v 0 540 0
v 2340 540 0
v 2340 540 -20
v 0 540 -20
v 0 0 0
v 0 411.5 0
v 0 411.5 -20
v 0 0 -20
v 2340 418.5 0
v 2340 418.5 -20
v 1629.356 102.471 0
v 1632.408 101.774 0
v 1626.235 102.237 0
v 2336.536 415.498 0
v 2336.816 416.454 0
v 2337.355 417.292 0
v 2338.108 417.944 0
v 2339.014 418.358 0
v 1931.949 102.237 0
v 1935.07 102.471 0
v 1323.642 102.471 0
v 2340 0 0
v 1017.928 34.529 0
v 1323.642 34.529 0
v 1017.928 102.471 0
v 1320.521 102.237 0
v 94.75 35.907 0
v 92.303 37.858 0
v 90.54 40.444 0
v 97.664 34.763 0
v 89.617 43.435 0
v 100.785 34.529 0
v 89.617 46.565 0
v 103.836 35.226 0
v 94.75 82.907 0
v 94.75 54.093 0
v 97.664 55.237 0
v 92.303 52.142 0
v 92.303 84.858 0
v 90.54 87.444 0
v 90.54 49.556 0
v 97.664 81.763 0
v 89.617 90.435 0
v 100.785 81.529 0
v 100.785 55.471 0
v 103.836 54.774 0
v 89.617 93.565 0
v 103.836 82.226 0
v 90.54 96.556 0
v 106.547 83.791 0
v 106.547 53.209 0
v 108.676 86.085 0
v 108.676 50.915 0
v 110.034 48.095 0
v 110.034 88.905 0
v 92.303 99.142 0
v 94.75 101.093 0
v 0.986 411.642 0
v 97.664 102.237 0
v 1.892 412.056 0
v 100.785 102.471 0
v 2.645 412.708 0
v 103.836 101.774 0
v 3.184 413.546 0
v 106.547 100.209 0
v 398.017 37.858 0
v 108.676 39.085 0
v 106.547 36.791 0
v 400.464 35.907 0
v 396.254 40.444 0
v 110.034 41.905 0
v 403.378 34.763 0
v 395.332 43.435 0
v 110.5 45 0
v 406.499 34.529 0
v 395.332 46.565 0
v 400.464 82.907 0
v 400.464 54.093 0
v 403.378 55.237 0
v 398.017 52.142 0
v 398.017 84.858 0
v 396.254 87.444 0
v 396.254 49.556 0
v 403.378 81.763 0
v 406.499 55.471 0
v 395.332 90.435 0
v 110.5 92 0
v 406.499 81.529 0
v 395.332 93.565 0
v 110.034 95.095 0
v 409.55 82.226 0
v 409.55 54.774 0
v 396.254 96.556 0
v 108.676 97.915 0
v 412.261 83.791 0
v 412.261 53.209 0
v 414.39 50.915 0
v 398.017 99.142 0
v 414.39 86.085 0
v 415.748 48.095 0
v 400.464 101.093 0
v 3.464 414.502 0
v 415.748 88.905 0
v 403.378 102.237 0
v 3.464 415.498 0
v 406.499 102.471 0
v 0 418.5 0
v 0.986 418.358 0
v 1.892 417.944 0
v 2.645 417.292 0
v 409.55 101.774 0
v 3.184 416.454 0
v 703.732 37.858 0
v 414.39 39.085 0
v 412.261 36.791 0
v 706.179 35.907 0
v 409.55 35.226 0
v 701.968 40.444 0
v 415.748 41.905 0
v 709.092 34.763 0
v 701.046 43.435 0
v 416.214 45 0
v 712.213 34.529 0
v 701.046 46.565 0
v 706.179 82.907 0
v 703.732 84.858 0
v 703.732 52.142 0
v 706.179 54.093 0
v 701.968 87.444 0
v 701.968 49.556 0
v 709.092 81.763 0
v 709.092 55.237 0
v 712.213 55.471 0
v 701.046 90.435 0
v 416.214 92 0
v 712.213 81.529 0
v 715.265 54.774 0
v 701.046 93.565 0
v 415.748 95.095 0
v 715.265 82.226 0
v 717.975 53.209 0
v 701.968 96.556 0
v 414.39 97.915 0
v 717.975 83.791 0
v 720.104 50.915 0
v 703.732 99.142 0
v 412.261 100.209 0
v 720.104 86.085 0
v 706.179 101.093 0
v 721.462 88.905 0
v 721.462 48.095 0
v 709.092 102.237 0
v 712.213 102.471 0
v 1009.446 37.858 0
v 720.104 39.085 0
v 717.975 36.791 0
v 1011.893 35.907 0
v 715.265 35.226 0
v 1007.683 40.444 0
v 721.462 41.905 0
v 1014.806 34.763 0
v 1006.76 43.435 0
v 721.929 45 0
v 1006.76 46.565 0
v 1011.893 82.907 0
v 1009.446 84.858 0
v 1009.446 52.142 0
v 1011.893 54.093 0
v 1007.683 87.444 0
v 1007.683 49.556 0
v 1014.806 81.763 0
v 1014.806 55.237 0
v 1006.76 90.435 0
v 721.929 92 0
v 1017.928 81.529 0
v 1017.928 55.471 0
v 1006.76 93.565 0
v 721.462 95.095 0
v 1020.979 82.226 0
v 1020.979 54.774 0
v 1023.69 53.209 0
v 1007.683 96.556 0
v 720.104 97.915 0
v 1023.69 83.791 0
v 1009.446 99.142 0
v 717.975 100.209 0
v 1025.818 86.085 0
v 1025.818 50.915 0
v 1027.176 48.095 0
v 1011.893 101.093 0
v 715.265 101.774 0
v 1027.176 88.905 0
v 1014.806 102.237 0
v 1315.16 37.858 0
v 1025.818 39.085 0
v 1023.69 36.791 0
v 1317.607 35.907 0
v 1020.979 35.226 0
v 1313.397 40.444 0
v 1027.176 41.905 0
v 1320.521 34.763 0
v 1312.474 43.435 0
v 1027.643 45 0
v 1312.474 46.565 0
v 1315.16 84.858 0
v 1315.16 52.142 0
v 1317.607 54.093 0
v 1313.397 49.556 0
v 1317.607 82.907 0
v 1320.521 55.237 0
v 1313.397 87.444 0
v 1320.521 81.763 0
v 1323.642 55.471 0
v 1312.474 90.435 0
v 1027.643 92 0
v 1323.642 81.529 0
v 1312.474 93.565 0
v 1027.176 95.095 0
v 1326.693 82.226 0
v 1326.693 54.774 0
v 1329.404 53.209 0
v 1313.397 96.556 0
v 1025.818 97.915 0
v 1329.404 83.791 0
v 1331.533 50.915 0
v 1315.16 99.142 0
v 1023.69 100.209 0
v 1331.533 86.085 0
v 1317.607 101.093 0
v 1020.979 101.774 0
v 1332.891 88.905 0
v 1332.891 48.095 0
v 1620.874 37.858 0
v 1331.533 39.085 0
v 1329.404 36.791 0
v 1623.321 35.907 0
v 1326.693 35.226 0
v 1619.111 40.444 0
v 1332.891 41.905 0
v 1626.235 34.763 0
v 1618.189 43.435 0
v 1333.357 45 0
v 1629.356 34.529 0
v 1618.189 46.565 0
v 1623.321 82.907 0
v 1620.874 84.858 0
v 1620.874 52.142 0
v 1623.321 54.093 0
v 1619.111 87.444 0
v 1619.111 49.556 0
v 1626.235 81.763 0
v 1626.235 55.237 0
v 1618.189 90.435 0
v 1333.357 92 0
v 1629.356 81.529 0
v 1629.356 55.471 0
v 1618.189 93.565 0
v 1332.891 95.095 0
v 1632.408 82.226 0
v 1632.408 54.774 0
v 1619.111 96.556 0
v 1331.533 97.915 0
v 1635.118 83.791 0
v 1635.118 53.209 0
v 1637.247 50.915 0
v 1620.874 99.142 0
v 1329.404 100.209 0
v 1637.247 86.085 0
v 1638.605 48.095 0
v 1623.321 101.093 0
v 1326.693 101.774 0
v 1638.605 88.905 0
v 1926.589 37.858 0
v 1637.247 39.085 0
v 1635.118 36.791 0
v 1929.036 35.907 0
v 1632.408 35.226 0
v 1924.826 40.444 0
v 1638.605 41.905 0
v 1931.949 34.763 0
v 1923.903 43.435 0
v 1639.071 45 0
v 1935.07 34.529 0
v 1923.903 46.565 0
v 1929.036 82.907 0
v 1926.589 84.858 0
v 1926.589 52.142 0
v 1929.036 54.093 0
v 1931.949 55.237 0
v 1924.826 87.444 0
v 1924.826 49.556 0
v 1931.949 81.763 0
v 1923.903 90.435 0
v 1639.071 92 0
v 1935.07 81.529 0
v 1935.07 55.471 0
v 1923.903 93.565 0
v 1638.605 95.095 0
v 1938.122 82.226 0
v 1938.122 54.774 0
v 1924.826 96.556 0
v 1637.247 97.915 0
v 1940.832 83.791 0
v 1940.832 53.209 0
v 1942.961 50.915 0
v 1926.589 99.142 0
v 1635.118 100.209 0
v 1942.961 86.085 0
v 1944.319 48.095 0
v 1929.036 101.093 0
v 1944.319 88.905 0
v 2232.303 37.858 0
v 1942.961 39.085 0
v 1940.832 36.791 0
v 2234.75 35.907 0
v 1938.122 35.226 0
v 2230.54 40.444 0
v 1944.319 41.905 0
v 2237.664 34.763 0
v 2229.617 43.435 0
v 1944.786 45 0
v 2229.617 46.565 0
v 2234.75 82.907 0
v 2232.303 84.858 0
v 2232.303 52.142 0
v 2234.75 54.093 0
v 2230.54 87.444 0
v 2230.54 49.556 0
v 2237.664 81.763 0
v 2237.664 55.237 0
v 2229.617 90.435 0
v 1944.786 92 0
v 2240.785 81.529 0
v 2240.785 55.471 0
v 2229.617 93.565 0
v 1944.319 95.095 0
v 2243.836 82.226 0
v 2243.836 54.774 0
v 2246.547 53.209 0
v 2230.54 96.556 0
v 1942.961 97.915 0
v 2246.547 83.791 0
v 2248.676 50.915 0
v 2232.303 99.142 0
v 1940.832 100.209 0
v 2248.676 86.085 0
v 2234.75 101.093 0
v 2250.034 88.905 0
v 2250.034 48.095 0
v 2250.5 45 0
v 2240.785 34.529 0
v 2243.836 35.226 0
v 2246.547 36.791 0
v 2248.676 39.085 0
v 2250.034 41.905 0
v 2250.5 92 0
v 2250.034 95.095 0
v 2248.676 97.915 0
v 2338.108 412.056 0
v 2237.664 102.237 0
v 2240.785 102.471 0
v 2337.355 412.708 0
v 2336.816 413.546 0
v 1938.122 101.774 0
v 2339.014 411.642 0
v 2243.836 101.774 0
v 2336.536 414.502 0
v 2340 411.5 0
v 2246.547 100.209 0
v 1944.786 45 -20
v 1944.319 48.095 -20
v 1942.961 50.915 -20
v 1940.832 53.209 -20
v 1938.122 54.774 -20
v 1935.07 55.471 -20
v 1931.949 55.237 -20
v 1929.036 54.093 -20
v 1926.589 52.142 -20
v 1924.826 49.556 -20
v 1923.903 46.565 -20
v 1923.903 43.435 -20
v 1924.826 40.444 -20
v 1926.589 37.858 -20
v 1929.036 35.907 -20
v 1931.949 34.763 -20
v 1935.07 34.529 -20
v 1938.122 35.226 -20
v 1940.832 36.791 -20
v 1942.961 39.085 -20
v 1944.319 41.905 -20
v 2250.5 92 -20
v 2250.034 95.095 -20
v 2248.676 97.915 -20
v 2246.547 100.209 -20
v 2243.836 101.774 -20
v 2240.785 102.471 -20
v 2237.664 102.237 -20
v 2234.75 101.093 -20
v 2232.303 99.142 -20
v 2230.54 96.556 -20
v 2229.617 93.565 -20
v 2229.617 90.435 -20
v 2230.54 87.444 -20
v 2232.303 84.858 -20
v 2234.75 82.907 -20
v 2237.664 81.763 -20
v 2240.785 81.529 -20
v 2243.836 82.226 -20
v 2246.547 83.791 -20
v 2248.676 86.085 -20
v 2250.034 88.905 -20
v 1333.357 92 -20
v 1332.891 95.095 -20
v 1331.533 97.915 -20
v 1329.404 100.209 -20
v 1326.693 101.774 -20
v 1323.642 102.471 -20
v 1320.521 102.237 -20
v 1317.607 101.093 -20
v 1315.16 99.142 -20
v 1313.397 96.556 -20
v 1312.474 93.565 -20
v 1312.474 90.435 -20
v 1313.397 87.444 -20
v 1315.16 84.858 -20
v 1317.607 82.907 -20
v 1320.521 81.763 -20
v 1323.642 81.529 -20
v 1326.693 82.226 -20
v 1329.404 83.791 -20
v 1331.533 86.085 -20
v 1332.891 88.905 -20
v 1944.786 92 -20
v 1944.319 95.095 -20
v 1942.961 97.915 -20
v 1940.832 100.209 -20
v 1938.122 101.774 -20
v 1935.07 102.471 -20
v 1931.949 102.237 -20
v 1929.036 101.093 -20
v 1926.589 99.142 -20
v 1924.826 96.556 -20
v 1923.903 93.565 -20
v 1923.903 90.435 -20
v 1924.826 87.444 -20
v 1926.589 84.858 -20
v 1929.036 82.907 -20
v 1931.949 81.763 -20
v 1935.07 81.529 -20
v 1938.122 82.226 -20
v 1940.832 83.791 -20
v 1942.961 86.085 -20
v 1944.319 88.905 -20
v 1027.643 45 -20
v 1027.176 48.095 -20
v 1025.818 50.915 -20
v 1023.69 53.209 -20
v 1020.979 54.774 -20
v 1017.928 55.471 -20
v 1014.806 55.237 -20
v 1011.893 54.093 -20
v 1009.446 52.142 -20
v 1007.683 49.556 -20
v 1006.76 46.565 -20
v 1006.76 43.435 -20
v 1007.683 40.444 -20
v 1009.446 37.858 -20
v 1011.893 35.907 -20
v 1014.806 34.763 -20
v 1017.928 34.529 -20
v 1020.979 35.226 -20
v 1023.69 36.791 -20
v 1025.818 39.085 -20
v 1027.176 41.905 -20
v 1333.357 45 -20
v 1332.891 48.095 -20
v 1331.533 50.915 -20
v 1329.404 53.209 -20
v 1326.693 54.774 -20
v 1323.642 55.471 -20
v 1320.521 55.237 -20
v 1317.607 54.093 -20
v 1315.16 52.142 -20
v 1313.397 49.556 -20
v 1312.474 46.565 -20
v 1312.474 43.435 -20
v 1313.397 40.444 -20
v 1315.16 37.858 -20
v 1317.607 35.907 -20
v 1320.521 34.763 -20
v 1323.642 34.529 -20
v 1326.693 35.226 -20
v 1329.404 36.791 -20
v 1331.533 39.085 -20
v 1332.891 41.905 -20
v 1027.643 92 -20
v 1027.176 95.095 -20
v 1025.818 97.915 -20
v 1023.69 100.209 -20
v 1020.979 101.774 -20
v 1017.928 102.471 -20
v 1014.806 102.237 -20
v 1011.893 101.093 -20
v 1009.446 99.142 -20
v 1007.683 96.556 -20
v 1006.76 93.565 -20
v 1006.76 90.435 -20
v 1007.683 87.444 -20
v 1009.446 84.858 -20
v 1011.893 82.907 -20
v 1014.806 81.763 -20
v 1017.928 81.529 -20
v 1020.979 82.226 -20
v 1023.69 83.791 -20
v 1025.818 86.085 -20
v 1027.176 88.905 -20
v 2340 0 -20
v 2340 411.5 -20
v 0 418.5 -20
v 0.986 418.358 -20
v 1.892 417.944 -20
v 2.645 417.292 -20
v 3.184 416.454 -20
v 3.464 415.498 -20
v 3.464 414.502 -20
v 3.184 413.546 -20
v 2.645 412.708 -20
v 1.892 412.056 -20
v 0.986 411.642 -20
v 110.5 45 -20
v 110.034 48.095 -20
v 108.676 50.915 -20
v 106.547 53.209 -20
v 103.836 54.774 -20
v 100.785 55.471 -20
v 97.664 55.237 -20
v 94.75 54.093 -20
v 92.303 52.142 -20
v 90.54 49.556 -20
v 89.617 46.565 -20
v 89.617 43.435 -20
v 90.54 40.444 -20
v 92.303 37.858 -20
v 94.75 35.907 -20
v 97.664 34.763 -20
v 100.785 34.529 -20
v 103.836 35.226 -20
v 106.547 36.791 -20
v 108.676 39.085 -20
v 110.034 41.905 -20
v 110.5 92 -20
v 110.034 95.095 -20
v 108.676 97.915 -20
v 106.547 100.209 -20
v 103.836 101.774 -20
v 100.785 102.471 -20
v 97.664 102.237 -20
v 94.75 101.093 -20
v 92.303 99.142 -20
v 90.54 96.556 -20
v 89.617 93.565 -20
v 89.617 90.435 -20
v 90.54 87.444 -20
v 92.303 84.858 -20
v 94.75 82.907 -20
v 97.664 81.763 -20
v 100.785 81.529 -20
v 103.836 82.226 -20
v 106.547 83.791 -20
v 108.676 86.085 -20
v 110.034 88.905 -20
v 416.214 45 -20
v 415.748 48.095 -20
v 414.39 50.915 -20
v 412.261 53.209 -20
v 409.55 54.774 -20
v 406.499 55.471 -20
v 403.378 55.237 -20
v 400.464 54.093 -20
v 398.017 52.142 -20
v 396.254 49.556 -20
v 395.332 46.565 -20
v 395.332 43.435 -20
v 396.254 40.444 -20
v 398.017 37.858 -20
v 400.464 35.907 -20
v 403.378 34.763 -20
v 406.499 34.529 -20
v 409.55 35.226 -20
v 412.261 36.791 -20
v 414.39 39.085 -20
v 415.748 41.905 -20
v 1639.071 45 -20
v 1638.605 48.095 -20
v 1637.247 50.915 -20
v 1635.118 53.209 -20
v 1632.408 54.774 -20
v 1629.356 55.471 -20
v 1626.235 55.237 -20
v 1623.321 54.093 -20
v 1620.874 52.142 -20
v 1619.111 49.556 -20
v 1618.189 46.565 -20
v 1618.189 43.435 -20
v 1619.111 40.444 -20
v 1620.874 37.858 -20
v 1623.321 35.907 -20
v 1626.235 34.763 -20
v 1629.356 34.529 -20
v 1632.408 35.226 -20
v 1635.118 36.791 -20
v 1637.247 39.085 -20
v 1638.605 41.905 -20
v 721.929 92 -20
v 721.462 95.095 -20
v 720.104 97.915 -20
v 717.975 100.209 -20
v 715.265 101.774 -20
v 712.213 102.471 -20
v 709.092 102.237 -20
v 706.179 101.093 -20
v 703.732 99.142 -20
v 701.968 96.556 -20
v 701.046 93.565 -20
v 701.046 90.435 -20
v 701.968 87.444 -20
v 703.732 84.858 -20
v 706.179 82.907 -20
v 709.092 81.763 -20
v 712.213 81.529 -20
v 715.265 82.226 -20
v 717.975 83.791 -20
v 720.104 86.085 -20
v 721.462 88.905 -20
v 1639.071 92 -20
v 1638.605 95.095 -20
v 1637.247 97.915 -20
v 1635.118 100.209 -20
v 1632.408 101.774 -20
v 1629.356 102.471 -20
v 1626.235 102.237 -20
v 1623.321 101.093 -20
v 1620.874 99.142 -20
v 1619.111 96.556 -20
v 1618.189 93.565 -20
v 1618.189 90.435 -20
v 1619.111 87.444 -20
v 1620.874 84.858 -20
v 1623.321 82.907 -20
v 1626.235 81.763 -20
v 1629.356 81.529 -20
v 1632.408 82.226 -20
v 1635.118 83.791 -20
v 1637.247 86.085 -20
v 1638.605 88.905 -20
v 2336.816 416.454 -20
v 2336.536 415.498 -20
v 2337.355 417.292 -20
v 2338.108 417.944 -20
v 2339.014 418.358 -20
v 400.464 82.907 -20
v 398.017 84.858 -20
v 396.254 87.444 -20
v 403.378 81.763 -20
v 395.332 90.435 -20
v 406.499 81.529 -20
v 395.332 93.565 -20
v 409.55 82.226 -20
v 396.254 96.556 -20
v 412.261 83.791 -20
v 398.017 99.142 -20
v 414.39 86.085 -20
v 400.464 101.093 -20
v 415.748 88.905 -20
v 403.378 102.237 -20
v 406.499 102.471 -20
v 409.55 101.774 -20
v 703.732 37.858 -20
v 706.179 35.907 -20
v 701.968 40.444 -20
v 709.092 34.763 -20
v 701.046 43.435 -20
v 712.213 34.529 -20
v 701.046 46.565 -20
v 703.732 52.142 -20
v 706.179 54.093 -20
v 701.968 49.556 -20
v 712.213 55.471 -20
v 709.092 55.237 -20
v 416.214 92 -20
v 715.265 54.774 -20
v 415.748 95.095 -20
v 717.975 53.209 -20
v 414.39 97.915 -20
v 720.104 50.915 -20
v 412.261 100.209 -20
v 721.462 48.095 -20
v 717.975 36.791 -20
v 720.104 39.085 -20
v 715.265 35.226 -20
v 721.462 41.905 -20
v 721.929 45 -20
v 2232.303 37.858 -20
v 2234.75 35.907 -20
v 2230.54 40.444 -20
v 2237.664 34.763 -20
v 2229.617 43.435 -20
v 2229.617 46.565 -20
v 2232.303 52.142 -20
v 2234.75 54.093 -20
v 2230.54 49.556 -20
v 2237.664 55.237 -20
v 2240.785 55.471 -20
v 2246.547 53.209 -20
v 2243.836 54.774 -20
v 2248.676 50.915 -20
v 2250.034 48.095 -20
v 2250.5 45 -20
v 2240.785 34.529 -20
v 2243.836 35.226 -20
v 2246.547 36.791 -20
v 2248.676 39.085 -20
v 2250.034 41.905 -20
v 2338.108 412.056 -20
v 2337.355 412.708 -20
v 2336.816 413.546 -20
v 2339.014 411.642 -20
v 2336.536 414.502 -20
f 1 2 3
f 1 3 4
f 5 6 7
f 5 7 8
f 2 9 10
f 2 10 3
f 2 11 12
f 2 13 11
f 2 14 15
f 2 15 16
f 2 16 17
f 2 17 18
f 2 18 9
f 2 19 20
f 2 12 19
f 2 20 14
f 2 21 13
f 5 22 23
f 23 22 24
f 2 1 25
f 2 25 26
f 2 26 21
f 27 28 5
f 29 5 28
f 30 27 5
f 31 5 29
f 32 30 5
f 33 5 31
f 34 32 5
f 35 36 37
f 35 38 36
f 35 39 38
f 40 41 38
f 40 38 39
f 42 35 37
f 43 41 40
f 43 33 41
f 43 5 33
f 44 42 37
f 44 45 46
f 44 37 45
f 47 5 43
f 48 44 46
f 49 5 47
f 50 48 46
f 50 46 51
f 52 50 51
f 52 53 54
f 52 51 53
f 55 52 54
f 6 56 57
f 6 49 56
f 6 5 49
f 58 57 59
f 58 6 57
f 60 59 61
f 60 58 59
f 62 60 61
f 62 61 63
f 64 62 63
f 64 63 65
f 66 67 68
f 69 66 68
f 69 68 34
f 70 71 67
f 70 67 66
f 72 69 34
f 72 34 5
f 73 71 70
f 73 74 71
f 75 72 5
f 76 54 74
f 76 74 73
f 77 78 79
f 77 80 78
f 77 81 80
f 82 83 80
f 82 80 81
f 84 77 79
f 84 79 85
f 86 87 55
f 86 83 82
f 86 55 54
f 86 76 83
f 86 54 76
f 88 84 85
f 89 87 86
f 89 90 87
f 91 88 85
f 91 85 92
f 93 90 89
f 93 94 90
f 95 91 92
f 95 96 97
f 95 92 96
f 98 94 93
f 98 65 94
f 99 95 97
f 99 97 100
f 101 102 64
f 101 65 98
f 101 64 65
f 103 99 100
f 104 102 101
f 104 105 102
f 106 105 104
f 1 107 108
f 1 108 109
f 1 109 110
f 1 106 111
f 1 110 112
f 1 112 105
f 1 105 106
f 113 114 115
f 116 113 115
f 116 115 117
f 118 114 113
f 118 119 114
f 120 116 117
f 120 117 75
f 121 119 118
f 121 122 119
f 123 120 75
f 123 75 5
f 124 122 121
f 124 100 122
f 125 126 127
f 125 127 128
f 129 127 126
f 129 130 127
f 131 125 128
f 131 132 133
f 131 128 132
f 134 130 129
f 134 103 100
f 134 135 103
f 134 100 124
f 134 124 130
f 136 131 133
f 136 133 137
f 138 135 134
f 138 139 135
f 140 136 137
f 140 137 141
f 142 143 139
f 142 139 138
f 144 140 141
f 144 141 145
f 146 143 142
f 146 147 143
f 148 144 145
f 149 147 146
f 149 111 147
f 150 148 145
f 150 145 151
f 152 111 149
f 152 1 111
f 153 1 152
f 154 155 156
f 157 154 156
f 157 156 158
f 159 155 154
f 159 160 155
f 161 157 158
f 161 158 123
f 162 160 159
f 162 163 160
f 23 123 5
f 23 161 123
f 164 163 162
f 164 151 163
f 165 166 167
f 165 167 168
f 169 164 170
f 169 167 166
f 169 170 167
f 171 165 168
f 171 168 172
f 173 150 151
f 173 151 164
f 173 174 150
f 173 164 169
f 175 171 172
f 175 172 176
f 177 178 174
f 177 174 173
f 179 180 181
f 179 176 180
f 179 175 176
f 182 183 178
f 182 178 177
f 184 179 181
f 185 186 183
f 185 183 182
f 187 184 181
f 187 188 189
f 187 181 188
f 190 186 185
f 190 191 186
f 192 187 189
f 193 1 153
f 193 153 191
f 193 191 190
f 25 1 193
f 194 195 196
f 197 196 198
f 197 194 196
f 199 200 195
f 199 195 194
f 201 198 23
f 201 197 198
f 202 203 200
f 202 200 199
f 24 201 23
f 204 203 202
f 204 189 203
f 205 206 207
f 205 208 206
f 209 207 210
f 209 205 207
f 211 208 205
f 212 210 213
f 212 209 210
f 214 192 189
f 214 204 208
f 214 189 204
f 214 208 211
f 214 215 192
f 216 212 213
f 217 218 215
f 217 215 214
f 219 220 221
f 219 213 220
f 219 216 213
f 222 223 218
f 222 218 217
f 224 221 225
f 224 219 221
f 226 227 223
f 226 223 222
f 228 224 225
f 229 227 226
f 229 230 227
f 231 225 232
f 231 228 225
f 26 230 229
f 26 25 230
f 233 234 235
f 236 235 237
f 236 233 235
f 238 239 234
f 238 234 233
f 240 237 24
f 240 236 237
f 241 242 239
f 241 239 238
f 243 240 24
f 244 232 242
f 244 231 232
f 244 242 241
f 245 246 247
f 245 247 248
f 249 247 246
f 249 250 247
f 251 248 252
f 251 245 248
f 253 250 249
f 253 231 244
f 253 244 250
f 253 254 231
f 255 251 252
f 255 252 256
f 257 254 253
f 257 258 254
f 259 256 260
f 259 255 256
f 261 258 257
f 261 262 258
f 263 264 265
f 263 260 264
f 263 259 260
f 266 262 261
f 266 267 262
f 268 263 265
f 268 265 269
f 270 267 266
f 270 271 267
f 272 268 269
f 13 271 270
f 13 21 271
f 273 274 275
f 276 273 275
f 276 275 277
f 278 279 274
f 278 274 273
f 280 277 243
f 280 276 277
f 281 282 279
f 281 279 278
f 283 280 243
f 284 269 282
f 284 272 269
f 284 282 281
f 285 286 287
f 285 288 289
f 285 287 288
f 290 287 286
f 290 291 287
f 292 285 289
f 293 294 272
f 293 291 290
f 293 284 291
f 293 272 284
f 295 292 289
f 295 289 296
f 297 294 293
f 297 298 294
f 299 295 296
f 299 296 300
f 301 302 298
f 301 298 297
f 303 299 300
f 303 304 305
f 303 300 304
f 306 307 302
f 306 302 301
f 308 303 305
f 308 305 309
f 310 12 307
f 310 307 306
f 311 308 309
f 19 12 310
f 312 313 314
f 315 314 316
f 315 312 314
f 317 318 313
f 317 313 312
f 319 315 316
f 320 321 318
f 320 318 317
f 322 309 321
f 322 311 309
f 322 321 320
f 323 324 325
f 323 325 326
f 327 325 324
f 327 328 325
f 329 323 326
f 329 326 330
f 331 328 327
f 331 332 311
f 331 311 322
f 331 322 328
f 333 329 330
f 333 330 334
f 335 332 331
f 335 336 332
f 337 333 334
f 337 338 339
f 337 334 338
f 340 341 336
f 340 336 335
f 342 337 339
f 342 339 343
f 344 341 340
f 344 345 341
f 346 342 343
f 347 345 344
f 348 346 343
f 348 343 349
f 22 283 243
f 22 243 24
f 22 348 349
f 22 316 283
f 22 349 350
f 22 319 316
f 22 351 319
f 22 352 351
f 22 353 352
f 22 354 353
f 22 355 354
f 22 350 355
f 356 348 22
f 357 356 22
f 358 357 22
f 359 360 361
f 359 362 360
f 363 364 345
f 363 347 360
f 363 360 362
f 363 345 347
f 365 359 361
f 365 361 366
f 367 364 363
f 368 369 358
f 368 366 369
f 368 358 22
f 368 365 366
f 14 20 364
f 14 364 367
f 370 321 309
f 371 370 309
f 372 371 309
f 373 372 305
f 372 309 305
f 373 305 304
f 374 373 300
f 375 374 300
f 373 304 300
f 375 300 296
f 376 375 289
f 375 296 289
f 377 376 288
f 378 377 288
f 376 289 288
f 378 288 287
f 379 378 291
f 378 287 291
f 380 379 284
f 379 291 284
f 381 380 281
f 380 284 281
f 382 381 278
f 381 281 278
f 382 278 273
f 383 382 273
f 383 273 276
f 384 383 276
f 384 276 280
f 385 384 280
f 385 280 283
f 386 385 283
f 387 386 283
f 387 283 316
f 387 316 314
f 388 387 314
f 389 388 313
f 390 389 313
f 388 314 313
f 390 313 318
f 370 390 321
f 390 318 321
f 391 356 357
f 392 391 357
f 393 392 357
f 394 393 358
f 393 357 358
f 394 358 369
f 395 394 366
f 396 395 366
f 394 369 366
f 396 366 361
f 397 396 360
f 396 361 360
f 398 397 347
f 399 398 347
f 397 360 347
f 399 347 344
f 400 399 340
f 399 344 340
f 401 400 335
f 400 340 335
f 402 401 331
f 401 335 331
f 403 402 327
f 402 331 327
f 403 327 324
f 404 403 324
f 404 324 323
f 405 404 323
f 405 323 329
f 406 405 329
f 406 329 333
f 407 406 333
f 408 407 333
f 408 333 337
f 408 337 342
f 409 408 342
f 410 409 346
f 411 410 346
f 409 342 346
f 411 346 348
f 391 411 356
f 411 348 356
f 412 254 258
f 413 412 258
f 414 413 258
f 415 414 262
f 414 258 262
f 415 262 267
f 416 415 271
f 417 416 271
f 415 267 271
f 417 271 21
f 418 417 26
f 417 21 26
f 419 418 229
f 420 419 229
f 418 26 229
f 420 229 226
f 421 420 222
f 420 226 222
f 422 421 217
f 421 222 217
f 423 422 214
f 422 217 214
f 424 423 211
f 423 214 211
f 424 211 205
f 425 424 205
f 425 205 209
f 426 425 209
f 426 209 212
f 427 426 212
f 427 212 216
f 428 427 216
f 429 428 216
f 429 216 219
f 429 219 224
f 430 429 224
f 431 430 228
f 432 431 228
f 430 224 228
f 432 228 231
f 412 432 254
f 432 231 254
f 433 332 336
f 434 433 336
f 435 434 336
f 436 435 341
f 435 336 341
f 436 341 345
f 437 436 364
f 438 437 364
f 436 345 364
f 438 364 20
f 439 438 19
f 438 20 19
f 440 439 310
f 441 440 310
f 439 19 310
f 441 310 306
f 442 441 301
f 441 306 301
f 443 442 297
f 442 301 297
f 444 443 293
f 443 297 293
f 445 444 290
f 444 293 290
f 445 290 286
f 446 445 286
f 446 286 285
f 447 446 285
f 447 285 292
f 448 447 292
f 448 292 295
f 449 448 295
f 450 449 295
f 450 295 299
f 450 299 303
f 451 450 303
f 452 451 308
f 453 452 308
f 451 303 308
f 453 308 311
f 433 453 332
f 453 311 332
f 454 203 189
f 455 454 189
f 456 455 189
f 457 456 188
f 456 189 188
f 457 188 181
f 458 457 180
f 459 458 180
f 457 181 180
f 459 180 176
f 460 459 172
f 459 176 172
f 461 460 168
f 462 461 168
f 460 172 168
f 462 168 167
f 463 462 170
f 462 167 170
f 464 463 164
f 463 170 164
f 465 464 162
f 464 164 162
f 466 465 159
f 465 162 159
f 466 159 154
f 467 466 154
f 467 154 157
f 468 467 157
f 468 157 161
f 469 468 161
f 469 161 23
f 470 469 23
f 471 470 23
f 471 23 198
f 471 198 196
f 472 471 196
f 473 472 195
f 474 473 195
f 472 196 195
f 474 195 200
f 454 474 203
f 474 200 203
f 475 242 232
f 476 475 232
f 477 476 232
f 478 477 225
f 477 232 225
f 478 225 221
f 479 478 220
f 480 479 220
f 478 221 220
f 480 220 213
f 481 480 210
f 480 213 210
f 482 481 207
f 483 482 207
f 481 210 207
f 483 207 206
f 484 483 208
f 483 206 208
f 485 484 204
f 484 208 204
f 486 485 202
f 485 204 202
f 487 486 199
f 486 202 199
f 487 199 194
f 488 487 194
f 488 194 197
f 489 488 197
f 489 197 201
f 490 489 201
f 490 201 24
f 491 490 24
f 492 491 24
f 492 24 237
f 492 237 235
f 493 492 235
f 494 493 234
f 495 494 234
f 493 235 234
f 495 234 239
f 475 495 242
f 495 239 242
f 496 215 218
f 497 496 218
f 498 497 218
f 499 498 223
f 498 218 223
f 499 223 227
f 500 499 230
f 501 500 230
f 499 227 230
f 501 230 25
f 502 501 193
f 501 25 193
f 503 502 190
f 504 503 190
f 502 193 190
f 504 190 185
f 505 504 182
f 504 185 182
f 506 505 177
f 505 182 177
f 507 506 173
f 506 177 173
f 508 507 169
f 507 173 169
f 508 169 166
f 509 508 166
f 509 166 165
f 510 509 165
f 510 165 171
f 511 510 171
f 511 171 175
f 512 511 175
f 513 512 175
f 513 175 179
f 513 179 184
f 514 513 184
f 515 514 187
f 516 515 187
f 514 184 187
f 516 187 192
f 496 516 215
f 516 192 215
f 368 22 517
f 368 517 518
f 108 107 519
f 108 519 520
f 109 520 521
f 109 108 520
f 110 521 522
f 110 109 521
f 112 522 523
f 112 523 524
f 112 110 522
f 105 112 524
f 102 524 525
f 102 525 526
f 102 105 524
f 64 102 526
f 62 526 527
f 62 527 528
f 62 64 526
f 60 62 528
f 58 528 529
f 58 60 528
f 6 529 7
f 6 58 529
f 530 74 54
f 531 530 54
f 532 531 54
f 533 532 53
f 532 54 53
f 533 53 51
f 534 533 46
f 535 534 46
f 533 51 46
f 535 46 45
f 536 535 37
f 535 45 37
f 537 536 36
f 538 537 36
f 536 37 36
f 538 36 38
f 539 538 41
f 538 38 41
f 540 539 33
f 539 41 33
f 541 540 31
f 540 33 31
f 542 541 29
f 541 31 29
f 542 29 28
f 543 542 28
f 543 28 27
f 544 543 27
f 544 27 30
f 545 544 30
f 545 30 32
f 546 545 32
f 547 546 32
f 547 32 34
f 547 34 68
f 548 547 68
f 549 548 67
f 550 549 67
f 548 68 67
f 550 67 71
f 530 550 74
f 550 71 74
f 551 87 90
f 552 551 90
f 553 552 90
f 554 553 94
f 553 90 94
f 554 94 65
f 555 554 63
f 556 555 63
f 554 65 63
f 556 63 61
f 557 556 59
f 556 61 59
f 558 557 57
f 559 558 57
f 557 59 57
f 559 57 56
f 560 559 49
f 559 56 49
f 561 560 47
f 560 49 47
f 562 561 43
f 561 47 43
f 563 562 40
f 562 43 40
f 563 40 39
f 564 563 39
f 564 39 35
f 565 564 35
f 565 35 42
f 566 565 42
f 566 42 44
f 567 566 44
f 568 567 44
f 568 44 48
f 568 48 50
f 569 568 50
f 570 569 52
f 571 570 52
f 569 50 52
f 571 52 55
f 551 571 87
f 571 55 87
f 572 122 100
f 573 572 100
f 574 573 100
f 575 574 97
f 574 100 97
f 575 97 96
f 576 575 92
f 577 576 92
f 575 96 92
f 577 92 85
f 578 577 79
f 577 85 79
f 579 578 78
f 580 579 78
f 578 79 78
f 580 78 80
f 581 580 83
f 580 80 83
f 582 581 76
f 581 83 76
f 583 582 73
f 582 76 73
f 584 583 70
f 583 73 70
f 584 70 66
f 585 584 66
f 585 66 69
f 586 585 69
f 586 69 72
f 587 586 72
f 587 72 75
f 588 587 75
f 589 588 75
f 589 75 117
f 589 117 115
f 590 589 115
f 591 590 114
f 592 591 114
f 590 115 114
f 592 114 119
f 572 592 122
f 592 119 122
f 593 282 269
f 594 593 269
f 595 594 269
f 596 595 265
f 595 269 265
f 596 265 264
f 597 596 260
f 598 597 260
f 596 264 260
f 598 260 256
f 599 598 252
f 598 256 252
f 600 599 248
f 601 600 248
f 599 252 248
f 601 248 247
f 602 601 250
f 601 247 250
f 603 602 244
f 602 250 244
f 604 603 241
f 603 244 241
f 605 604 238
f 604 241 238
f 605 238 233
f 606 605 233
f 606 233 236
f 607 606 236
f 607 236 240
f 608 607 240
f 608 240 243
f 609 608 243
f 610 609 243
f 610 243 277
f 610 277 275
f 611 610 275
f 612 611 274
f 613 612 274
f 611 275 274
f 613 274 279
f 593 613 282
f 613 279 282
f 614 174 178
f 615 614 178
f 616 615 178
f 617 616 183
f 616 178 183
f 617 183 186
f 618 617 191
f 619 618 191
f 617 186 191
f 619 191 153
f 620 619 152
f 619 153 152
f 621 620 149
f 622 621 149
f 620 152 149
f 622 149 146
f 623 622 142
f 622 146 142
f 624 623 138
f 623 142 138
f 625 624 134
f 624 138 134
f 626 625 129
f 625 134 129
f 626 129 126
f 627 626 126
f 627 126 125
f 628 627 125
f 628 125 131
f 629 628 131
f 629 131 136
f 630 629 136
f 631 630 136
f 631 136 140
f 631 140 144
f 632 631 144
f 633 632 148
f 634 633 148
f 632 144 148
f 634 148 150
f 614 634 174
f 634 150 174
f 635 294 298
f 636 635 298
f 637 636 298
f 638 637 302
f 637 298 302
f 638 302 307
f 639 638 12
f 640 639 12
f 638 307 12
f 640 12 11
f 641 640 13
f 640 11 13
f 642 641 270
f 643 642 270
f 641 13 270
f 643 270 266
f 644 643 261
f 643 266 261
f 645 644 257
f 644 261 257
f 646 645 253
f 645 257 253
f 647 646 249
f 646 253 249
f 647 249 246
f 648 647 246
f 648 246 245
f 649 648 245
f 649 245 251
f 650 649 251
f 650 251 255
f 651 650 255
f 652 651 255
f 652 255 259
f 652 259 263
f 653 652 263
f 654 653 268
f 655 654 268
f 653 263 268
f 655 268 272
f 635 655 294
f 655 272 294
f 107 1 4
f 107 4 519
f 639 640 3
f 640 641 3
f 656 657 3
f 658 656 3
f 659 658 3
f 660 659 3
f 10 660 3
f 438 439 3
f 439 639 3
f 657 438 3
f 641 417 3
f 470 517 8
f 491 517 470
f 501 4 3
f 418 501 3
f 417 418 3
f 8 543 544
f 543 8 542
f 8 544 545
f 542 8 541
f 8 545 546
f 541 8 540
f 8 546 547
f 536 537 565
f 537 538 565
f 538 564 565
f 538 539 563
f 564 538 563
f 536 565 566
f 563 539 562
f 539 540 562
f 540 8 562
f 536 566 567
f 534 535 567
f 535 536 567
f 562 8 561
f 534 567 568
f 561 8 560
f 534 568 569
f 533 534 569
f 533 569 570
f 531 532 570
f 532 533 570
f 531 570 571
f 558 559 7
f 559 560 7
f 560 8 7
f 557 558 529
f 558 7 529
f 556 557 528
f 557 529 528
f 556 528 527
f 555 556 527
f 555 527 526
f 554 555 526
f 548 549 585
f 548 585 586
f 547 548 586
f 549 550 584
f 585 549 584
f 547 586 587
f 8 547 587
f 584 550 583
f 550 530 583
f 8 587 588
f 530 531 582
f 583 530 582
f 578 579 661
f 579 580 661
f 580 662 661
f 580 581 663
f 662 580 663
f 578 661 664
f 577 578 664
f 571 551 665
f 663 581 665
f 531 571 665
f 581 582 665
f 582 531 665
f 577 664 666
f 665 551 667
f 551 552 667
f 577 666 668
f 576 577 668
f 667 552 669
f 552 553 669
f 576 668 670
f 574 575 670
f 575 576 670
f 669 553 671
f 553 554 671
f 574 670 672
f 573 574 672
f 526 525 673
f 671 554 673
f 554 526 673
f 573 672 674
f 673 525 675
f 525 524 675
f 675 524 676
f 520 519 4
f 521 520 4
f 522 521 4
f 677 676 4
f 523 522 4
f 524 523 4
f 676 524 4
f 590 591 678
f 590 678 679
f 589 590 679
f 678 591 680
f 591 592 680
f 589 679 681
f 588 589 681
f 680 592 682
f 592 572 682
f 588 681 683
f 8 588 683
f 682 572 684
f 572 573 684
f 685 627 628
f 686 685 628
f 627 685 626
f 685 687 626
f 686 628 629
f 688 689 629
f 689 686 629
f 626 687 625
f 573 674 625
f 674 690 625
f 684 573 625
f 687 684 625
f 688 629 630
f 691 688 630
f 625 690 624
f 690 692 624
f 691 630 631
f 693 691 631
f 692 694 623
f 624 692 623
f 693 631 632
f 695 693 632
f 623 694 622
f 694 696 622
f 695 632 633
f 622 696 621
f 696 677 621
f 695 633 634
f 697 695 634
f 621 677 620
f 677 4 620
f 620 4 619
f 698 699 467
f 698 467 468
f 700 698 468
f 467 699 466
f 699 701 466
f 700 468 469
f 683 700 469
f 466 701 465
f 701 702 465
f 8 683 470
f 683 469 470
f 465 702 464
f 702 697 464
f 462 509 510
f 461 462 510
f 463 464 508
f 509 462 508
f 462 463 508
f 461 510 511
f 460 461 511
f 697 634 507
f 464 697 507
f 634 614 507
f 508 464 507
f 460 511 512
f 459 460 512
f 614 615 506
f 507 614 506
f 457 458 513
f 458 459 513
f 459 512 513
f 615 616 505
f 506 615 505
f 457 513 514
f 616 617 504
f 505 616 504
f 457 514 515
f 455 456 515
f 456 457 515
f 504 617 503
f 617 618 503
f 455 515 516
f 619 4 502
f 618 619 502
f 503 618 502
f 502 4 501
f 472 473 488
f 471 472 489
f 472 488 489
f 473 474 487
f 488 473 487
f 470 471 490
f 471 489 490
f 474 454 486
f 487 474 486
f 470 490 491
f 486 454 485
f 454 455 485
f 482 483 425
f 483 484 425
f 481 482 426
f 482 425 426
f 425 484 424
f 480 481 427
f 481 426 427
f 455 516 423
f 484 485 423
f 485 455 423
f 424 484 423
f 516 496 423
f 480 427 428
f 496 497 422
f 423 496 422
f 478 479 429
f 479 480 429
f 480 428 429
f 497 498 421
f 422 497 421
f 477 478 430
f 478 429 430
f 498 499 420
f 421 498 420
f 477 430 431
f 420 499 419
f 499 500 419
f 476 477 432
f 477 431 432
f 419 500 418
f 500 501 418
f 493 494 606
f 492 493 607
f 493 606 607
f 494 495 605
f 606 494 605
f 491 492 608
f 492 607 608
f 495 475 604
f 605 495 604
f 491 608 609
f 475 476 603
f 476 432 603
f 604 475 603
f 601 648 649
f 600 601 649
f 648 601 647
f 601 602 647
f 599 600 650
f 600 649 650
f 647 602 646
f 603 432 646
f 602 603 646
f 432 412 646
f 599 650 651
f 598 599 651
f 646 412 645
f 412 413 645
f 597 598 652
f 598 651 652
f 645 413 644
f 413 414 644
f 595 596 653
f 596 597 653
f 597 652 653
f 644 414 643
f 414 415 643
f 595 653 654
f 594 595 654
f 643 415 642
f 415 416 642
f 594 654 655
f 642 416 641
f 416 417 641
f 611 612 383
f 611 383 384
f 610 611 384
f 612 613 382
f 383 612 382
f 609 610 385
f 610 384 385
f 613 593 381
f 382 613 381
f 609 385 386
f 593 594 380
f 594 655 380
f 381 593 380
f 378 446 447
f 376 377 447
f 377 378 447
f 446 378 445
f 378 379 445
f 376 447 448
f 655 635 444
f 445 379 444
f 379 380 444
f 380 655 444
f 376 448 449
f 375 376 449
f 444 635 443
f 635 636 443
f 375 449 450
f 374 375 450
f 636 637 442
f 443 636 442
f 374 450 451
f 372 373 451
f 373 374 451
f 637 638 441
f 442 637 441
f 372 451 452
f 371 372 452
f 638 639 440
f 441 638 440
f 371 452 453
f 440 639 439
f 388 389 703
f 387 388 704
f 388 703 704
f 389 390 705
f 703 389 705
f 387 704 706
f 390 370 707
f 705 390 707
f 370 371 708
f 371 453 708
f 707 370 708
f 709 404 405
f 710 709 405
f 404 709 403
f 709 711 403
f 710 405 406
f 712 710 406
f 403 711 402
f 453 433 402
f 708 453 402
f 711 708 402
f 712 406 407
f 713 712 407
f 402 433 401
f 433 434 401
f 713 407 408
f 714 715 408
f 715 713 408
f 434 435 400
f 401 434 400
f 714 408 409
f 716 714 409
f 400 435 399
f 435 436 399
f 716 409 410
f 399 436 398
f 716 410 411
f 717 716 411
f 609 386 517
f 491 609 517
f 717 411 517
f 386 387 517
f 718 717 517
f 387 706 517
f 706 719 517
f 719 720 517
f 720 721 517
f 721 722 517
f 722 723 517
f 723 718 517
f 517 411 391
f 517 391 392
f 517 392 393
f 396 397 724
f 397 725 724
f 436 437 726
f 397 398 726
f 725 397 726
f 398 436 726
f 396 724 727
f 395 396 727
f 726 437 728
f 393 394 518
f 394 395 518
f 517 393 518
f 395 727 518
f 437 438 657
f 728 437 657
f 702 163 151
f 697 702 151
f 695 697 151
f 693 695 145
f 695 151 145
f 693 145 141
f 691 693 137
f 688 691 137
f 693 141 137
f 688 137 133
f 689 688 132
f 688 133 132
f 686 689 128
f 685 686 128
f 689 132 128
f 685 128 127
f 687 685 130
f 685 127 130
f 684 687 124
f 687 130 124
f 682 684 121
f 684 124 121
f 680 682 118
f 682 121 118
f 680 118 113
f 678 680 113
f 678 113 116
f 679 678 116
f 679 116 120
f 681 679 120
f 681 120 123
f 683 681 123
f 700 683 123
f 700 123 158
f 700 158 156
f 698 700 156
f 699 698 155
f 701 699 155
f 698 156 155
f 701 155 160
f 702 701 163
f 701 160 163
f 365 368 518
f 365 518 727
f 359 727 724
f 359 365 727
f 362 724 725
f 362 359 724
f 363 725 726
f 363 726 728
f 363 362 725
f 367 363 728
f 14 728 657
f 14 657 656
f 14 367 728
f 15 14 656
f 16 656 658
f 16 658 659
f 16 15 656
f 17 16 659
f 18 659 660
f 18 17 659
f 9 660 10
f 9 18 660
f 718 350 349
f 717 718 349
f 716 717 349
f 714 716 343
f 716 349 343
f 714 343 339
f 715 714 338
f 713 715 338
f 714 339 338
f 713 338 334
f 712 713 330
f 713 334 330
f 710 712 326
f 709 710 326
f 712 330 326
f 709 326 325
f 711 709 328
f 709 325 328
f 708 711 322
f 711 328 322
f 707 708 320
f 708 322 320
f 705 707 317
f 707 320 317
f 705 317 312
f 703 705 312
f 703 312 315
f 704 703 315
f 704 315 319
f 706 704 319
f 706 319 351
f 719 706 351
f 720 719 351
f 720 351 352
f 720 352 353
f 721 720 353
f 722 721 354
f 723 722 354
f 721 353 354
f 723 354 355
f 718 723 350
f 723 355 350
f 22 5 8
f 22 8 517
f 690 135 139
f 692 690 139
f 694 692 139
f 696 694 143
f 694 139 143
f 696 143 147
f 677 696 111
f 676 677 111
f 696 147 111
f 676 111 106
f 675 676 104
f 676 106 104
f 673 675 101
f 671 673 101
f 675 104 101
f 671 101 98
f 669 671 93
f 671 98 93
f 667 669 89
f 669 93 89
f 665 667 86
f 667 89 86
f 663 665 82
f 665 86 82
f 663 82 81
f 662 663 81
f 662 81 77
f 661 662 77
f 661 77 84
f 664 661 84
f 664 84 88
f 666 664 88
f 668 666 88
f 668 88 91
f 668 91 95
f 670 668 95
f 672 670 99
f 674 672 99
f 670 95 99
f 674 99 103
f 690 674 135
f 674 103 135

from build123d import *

# Parameters (mm, degrees)
IZIM1_R            = 10.5
TABAN_FLAN_1_DEPTH = 20


# Sheet-metal steps are written as plain solids
with BuildPart() as part:
    # Çizim1 → Taban-Flanş1 (new body)
    with BuildSketch(Plane.XY):
        with BuildLine():
            Line((0, 0), (2340, 0))
            Line((2340, 0), (2340, 411.5))
            ThreePointArc((2340, 411.5), (2336.5, 415), (2340, 418.5))
            Line((2340, 418.5), (2340, 540))
            Line((2340, 540), (0, 540))
            Line((0, 540), (0, 418.5))
            ThreePointArc((0, 418.5), (3.5, 415), (0, 411.5))
            Line((0, 411.5), (0, 0))
        make_face()
        with Locations((100, 92)):
            Circle(IZIM1_R, mode=Mode.SUBTRACT)
        with Locations((100, 45)):
            Circle(IZIM1_R, mode=Mode.SUBTRACT)
        with Locations((405.714285714, 92)):
            Circle(IZIM1_R, mode=Mode.SUBTRACT)
        with Locations((405.714285714, 45)):
            Circle(IZIM1_R, mode=Mode.SUBTRACT)
        with Locations((711.428571429, 92)):
            Circle(IZIM1_R, mode=Mode.SUBTRACT)
        with Locations((711.428571429, 45)):
            Circle(IZIM1_R, mode=Mode.SUBTRACT)
        with Locations((1017.142857143, 92)):
            Circle(IZIM1_R, mode=Mode.SUBTRACT)
        with Locations((1017.142857143, 45)):
            Circle(IZIM1_R, mode=Mode.SUBTRACT)
        with Locations((1322.857142857, 92)):
            Circle(IZIM1_R, mode=Mode.SUBTRACT)
        with Locations((1322.857142857, 45)):
            Circle(IZIM1_R, mode=Mode.SUBTRACT)
        with Locations((1628.571428571, 92)):
            Circle(IZIM1_R, mode=Mode.SUBTRACT)
        with Locations((1628.571428571, 45)):
            Circle(IZIM1_R, mode=Mode.SUBTRACT)
        with Locations((1934.285714286, 92)):
            Circle(IZIM1_R, mode=Mode.SUBTRACT)
        with Locations((1934.285714286, 45)):
            Circle(IZIM1_R, mode=Mode.SUBTRACT)
        with Locations((2240, 92)):
            Circle(IZIM1_R, mode=Mode.SUBTRACT)
        with Locations((2240, 45)):
            Circle(IZIM1_R, mode=Mode.SUBTRACT)
    extrude(amount=-TABAN_FLAN_1_DEPTH)


solid = part.part
